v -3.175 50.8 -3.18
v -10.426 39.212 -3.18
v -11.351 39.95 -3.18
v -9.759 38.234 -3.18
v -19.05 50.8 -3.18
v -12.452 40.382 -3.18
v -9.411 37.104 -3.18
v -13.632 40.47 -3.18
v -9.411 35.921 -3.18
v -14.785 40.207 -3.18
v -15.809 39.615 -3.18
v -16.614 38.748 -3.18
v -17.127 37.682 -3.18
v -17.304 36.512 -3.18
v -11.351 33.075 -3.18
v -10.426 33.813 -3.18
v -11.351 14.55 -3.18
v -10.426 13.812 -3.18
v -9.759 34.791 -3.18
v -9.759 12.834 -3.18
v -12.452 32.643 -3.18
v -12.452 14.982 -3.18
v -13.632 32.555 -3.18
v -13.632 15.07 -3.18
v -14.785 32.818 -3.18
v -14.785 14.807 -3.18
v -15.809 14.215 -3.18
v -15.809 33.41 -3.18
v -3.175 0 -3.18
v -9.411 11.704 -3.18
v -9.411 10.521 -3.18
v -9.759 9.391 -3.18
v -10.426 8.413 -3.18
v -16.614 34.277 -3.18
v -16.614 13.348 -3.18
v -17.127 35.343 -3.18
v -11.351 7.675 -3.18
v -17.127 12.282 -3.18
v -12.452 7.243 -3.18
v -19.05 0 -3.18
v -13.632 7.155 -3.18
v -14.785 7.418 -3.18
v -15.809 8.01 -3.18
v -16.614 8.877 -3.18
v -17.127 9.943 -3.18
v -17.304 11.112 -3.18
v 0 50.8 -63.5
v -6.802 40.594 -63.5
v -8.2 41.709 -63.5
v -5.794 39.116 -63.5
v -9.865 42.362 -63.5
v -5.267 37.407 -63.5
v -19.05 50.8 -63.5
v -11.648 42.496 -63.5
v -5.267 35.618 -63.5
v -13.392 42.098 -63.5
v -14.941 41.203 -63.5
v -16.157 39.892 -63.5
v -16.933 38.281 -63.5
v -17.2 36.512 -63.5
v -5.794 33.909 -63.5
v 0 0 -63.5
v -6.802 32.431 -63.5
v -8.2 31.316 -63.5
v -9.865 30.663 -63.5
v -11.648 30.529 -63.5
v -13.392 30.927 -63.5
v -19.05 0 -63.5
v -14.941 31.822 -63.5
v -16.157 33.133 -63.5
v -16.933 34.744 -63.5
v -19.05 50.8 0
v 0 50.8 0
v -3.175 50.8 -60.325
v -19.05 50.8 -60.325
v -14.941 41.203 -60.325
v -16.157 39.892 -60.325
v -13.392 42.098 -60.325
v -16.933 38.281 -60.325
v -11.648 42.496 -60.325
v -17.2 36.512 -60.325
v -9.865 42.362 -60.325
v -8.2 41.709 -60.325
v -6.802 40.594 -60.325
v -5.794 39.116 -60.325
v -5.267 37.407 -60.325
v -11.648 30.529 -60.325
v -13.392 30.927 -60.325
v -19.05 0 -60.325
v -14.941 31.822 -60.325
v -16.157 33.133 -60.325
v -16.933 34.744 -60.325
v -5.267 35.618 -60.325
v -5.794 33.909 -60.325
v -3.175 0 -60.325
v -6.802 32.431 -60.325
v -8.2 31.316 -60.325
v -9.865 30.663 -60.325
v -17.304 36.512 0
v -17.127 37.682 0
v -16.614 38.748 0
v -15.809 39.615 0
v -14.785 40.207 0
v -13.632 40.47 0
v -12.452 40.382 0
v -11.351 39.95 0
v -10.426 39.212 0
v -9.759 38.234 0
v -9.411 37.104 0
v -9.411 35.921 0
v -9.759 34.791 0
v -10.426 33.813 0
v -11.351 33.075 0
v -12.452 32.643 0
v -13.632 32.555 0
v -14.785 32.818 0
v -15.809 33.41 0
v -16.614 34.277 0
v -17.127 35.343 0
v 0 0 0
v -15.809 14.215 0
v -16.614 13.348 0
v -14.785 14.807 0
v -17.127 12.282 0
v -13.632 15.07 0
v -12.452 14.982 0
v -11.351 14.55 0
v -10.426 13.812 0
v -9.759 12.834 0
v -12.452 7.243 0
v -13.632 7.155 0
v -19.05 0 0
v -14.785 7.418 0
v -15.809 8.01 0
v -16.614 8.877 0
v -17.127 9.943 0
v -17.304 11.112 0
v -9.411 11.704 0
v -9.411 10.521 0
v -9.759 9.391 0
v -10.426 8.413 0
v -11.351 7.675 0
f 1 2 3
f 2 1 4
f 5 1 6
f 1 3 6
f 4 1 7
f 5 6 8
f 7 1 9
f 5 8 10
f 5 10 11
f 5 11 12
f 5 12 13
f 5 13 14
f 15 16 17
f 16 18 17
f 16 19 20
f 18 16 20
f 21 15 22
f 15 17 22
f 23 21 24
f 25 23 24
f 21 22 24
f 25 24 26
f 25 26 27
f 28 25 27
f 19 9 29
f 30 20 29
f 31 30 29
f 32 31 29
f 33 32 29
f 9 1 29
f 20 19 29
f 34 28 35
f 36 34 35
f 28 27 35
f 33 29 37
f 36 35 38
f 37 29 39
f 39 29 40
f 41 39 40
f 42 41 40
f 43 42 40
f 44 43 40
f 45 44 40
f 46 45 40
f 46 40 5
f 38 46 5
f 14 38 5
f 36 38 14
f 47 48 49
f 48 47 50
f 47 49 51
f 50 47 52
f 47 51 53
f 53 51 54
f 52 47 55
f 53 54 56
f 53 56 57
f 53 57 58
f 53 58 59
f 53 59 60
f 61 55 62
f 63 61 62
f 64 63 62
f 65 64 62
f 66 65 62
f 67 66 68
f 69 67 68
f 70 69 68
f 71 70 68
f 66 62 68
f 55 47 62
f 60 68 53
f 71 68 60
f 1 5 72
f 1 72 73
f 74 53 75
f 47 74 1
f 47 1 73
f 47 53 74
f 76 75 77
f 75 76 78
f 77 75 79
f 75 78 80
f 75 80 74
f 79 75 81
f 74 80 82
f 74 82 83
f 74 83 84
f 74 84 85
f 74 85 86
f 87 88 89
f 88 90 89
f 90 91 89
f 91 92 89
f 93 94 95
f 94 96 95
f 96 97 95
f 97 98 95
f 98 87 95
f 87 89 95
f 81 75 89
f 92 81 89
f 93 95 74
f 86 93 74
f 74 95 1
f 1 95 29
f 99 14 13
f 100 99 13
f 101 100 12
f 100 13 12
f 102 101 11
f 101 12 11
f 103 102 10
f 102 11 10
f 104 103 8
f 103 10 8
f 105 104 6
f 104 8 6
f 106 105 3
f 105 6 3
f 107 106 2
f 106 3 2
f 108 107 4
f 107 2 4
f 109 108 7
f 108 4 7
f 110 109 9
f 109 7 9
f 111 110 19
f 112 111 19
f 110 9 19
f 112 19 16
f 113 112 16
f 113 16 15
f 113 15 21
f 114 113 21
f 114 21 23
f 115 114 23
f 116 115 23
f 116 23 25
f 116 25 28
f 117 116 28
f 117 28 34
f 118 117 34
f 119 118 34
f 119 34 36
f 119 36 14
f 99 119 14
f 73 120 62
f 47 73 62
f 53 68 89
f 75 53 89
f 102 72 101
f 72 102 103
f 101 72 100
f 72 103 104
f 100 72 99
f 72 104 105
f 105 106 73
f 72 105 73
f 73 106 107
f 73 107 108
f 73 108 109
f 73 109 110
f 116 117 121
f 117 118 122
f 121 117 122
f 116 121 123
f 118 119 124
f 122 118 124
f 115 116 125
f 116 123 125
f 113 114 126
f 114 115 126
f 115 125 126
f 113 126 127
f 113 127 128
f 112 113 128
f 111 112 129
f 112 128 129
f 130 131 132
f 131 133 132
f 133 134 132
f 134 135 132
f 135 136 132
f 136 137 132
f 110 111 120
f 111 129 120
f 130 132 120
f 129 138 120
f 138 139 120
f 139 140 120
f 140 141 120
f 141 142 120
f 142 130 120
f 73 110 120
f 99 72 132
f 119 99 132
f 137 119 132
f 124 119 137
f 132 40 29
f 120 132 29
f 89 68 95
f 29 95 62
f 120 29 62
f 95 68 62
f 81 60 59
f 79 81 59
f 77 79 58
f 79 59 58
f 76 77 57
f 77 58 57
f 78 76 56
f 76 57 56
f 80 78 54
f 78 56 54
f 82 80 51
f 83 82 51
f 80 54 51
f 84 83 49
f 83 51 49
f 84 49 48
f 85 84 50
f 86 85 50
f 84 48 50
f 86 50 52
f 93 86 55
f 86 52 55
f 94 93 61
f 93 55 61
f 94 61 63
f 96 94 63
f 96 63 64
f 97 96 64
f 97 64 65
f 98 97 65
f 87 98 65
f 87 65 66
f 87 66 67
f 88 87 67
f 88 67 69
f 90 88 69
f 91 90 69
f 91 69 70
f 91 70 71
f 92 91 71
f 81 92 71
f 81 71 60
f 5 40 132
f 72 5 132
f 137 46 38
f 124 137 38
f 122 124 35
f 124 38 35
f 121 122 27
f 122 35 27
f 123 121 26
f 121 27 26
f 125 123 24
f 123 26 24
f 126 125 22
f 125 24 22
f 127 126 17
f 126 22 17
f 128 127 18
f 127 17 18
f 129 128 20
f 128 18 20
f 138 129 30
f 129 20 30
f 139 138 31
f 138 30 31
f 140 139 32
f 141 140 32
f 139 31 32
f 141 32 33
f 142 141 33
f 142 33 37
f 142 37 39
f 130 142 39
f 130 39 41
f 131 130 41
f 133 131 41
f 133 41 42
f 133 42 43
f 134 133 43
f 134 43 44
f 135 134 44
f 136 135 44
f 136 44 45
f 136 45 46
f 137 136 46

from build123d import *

# Parameters (mm, degrees)
BOSS_EXTRUDE3_DEPTH    = 50.8
SKETCH8_R              = 6
PANEL_MOUNT_HOLE_DEPTH = 4
CUT_EXTRUDE1_REACH     = 5.18
SKETCH9_R              = 3.96875


with BuildPart() as part:
    # Sketch1 → Boss-Extrude3 (new body)
    with BuildSketch(Plane(origin=(0, 0, 0), x_dir=(1, 0, 0), z_dir=(0, 1, 0))):
        Polygon((-19.05, 63.5), (-19.05, 60.325), (-3.175, 60.325), (-3.175, 3.18), (-19.05, 3.18), (-19.05, 0), (0, 0), (0, 63.5), align=None)
    extrude(amount=BOSS_EXTRUDE3_DEPTH)

    # Sketch8 → Panel Mount Hole (cut)
    with BuildSketch(Plane(origin=(0, 0, -63.5), x_dir=(-1, 0, 0), z_dir=(0, 0, -1))):
        with Locations((11.2, 36.5125)):
            Circle(SKETCH8_R)
    extrude(amount=-PANEL_MOUNT_HOLE_DEPTH, mode=Mode.SUBTRACT)

    # Sketch9 → Cut-Extrude1 (cut, up to next)
    with BuildSketch(Plane(origin=(0, 0, -3.18), x_dir=(-1, 0, 0), z_dir=(0, 0, -1)), mode=Mode.PRIVATE) as cut_extrude1_sk1:
        with Locations((13.335, 36.5125)):
            Circle(SKETCH9_R)
    cut_extrude1_tool1 = extrude(cut_extrude1_sk1.sketch, amount=-CUT_EXTRUDE1_REACH, mode=Mode.PRIVATE) & part.part
    add(cut_extrude1_tool1.solids().sort_by_distance((-13.335, 36.5125, -3.18))[0], mode=Mode.SUBTRACT)
    # Sketch9 → Cut-Extrude1 (cut, up to next)
    with BuildSketch(Plane(origin=(0, 0, -3.18), x_dir=(-1, 0, 0), z_dir=(0, 0, -1)), mode=Mode.PRIVATE) as cut_extrude1_sk2:
        with Locations((13.335, 11.1125)):
            Circle(SKETCH9_R)
    cut_extrude1_tool2 = extrude(cut_extrude1_sk2.sketch, amount=-CUT_EXTRUDE1_REACH, mode=Mode.PRIVATE) & part.part
    add(cut_extrude1_tool2.solids().sort_by_distance((-13.335, 11.1125, -3.18))[0], mode=Mode.SUBTRACT)


solid = part.part
